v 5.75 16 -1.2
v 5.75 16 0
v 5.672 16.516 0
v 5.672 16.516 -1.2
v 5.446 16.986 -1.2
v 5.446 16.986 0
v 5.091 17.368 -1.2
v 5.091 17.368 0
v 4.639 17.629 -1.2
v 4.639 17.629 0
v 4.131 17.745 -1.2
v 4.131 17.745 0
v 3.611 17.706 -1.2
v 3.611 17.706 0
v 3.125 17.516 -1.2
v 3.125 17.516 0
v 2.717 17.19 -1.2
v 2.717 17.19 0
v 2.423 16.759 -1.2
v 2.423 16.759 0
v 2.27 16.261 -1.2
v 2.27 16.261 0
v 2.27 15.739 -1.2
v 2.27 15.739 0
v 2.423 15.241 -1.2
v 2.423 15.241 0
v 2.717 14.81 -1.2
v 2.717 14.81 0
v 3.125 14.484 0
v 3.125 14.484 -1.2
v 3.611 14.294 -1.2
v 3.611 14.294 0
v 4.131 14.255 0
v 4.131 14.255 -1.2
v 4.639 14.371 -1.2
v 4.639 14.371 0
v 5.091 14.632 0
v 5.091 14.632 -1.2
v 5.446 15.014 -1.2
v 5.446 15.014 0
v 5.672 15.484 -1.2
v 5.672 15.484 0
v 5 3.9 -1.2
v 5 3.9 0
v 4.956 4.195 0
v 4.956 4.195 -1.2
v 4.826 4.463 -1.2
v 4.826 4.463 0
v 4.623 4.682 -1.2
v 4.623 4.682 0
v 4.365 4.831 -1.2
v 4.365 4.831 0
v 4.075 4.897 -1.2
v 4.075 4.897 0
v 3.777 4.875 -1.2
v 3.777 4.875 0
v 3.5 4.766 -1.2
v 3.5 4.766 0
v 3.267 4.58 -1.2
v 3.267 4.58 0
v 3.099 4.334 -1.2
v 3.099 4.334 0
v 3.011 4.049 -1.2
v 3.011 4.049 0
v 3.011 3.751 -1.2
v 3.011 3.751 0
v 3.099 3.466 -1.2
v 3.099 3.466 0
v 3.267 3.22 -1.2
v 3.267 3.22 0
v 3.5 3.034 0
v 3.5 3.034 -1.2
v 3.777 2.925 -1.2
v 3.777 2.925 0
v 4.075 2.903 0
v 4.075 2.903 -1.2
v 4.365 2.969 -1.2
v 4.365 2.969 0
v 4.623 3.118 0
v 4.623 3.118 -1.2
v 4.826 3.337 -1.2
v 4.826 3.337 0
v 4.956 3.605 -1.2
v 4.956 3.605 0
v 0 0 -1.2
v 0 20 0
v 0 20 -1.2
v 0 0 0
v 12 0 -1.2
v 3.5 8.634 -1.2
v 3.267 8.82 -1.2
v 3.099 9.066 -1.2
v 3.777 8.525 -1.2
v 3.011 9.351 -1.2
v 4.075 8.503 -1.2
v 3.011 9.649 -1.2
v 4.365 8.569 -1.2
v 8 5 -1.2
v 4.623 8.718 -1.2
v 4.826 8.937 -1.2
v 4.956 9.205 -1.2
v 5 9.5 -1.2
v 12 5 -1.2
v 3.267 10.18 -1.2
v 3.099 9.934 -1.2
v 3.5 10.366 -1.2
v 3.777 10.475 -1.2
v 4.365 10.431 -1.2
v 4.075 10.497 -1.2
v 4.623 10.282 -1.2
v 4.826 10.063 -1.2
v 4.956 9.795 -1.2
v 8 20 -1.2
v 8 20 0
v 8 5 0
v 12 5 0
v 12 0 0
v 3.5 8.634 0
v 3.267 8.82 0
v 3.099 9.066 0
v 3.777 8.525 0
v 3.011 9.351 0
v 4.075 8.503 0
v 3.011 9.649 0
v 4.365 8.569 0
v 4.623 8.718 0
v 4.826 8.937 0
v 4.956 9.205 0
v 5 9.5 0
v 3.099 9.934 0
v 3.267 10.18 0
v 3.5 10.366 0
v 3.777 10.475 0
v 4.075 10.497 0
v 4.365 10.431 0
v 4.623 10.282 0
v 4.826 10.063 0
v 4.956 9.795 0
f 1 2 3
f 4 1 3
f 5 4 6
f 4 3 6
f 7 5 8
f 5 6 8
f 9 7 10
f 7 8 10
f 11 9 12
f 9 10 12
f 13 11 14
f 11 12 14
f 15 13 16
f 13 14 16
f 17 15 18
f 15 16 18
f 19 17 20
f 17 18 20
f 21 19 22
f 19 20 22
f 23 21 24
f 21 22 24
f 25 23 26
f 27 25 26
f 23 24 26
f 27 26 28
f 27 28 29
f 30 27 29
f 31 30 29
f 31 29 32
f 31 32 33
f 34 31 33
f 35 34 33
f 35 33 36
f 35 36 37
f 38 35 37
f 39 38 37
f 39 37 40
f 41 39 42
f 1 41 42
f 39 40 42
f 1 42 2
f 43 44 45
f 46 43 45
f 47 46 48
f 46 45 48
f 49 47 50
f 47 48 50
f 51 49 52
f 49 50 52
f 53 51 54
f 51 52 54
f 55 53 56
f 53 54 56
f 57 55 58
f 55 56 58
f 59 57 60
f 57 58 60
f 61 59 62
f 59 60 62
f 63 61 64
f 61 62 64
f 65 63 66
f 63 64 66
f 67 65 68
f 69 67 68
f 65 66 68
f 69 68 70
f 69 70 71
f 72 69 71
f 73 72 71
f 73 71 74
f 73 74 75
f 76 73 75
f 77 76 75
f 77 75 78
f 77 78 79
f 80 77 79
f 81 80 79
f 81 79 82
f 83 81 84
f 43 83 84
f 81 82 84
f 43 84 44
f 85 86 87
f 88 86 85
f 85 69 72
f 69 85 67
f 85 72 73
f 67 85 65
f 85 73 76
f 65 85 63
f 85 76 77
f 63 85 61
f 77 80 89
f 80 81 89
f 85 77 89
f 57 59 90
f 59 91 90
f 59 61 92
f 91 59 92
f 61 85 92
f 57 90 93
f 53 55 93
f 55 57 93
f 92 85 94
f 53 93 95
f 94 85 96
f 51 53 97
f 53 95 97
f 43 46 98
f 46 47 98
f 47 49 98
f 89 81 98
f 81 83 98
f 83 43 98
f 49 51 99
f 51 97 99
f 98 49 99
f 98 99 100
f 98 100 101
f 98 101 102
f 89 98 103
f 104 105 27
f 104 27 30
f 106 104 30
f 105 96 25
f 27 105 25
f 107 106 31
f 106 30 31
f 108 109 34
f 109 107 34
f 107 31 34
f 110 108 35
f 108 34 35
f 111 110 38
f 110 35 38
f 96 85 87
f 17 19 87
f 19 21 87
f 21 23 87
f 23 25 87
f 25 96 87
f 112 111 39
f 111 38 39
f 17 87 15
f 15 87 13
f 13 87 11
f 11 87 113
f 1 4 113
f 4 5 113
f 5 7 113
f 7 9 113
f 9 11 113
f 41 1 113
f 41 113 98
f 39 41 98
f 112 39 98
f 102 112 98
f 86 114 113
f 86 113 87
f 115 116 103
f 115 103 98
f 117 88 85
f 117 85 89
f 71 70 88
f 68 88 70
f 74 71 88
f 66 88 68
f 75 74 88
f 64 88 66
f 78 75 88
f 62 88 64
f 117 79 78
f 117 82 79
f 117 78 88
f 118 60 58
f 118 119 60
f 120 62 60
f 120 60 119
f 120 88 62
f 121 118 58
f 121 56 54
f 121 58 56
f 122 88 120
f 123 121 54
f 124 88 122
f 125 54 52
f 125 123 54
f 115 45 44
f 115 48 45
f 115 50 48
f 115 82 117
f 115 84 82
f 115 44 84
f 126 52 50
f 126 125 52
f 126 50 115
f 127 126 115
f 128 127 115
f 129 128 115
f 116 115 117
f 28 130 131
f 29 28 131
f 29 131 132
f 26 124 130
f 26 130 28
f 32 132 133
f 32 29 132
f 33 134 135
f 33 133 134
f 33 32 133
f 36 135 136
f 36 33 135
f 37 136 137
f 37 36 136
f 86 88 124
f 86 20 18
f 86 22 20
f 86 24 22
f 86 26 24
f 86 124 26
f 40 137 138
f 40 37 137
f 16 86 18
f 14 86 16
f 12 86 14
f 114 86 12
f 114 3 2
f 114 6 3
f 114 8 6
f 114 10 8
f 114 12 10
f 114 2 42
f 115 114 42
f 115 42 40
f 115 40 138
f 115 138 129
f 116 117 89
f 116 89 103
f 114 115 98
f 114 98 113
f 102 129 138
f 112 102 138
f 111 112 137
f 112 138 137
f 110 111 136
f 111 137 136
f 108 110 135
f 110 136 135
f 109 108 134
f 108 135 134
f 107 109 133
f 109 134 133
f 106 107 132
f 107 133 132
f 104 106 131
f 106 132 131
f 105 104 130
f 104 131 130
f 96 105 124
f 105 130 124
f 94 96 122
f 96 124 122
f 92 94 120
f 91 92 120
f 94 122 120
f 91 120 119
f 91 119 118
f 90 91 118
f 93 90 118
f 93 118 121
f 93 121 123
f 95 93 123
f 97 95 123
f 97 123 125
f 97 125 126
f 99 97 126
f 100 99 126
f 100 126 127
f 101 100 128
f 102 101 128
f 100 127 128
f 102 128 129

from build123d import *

# Parameters (mm, degrees)
SKETCH_1_R             = 1.75
SKETCH_1_R_2           = 1
SM_BASE_FLANGE_1_DEPTH = 1.2


# Sheet-metal steps are written as plain solids
with BuildPart() as part:
    # Sketch 1 → Базовая кромка1 (new body)
    with BuildSketch(Plane.XY):
        Polygon((0, 0), (12, 0), (12, 5), (8, 5), (8, 20), (0, 20), align=None)
        with Locations((4, 16)):
            Circle(SKETCH_1_R, mode=Mode.SUBTRACT)
        with Locations((4, 9.5)):
            Circle(SKETCH_1_R_2, mode=Mode.SUBTRACT)
        with Locations((4, 3.9)):
            Circle(SKETCH_1_R_2, mode=Mode.SUBTRACT)
    extrude(amount=-SM_BASE_FLANGE_1_DEPTH)


solid = part.part
